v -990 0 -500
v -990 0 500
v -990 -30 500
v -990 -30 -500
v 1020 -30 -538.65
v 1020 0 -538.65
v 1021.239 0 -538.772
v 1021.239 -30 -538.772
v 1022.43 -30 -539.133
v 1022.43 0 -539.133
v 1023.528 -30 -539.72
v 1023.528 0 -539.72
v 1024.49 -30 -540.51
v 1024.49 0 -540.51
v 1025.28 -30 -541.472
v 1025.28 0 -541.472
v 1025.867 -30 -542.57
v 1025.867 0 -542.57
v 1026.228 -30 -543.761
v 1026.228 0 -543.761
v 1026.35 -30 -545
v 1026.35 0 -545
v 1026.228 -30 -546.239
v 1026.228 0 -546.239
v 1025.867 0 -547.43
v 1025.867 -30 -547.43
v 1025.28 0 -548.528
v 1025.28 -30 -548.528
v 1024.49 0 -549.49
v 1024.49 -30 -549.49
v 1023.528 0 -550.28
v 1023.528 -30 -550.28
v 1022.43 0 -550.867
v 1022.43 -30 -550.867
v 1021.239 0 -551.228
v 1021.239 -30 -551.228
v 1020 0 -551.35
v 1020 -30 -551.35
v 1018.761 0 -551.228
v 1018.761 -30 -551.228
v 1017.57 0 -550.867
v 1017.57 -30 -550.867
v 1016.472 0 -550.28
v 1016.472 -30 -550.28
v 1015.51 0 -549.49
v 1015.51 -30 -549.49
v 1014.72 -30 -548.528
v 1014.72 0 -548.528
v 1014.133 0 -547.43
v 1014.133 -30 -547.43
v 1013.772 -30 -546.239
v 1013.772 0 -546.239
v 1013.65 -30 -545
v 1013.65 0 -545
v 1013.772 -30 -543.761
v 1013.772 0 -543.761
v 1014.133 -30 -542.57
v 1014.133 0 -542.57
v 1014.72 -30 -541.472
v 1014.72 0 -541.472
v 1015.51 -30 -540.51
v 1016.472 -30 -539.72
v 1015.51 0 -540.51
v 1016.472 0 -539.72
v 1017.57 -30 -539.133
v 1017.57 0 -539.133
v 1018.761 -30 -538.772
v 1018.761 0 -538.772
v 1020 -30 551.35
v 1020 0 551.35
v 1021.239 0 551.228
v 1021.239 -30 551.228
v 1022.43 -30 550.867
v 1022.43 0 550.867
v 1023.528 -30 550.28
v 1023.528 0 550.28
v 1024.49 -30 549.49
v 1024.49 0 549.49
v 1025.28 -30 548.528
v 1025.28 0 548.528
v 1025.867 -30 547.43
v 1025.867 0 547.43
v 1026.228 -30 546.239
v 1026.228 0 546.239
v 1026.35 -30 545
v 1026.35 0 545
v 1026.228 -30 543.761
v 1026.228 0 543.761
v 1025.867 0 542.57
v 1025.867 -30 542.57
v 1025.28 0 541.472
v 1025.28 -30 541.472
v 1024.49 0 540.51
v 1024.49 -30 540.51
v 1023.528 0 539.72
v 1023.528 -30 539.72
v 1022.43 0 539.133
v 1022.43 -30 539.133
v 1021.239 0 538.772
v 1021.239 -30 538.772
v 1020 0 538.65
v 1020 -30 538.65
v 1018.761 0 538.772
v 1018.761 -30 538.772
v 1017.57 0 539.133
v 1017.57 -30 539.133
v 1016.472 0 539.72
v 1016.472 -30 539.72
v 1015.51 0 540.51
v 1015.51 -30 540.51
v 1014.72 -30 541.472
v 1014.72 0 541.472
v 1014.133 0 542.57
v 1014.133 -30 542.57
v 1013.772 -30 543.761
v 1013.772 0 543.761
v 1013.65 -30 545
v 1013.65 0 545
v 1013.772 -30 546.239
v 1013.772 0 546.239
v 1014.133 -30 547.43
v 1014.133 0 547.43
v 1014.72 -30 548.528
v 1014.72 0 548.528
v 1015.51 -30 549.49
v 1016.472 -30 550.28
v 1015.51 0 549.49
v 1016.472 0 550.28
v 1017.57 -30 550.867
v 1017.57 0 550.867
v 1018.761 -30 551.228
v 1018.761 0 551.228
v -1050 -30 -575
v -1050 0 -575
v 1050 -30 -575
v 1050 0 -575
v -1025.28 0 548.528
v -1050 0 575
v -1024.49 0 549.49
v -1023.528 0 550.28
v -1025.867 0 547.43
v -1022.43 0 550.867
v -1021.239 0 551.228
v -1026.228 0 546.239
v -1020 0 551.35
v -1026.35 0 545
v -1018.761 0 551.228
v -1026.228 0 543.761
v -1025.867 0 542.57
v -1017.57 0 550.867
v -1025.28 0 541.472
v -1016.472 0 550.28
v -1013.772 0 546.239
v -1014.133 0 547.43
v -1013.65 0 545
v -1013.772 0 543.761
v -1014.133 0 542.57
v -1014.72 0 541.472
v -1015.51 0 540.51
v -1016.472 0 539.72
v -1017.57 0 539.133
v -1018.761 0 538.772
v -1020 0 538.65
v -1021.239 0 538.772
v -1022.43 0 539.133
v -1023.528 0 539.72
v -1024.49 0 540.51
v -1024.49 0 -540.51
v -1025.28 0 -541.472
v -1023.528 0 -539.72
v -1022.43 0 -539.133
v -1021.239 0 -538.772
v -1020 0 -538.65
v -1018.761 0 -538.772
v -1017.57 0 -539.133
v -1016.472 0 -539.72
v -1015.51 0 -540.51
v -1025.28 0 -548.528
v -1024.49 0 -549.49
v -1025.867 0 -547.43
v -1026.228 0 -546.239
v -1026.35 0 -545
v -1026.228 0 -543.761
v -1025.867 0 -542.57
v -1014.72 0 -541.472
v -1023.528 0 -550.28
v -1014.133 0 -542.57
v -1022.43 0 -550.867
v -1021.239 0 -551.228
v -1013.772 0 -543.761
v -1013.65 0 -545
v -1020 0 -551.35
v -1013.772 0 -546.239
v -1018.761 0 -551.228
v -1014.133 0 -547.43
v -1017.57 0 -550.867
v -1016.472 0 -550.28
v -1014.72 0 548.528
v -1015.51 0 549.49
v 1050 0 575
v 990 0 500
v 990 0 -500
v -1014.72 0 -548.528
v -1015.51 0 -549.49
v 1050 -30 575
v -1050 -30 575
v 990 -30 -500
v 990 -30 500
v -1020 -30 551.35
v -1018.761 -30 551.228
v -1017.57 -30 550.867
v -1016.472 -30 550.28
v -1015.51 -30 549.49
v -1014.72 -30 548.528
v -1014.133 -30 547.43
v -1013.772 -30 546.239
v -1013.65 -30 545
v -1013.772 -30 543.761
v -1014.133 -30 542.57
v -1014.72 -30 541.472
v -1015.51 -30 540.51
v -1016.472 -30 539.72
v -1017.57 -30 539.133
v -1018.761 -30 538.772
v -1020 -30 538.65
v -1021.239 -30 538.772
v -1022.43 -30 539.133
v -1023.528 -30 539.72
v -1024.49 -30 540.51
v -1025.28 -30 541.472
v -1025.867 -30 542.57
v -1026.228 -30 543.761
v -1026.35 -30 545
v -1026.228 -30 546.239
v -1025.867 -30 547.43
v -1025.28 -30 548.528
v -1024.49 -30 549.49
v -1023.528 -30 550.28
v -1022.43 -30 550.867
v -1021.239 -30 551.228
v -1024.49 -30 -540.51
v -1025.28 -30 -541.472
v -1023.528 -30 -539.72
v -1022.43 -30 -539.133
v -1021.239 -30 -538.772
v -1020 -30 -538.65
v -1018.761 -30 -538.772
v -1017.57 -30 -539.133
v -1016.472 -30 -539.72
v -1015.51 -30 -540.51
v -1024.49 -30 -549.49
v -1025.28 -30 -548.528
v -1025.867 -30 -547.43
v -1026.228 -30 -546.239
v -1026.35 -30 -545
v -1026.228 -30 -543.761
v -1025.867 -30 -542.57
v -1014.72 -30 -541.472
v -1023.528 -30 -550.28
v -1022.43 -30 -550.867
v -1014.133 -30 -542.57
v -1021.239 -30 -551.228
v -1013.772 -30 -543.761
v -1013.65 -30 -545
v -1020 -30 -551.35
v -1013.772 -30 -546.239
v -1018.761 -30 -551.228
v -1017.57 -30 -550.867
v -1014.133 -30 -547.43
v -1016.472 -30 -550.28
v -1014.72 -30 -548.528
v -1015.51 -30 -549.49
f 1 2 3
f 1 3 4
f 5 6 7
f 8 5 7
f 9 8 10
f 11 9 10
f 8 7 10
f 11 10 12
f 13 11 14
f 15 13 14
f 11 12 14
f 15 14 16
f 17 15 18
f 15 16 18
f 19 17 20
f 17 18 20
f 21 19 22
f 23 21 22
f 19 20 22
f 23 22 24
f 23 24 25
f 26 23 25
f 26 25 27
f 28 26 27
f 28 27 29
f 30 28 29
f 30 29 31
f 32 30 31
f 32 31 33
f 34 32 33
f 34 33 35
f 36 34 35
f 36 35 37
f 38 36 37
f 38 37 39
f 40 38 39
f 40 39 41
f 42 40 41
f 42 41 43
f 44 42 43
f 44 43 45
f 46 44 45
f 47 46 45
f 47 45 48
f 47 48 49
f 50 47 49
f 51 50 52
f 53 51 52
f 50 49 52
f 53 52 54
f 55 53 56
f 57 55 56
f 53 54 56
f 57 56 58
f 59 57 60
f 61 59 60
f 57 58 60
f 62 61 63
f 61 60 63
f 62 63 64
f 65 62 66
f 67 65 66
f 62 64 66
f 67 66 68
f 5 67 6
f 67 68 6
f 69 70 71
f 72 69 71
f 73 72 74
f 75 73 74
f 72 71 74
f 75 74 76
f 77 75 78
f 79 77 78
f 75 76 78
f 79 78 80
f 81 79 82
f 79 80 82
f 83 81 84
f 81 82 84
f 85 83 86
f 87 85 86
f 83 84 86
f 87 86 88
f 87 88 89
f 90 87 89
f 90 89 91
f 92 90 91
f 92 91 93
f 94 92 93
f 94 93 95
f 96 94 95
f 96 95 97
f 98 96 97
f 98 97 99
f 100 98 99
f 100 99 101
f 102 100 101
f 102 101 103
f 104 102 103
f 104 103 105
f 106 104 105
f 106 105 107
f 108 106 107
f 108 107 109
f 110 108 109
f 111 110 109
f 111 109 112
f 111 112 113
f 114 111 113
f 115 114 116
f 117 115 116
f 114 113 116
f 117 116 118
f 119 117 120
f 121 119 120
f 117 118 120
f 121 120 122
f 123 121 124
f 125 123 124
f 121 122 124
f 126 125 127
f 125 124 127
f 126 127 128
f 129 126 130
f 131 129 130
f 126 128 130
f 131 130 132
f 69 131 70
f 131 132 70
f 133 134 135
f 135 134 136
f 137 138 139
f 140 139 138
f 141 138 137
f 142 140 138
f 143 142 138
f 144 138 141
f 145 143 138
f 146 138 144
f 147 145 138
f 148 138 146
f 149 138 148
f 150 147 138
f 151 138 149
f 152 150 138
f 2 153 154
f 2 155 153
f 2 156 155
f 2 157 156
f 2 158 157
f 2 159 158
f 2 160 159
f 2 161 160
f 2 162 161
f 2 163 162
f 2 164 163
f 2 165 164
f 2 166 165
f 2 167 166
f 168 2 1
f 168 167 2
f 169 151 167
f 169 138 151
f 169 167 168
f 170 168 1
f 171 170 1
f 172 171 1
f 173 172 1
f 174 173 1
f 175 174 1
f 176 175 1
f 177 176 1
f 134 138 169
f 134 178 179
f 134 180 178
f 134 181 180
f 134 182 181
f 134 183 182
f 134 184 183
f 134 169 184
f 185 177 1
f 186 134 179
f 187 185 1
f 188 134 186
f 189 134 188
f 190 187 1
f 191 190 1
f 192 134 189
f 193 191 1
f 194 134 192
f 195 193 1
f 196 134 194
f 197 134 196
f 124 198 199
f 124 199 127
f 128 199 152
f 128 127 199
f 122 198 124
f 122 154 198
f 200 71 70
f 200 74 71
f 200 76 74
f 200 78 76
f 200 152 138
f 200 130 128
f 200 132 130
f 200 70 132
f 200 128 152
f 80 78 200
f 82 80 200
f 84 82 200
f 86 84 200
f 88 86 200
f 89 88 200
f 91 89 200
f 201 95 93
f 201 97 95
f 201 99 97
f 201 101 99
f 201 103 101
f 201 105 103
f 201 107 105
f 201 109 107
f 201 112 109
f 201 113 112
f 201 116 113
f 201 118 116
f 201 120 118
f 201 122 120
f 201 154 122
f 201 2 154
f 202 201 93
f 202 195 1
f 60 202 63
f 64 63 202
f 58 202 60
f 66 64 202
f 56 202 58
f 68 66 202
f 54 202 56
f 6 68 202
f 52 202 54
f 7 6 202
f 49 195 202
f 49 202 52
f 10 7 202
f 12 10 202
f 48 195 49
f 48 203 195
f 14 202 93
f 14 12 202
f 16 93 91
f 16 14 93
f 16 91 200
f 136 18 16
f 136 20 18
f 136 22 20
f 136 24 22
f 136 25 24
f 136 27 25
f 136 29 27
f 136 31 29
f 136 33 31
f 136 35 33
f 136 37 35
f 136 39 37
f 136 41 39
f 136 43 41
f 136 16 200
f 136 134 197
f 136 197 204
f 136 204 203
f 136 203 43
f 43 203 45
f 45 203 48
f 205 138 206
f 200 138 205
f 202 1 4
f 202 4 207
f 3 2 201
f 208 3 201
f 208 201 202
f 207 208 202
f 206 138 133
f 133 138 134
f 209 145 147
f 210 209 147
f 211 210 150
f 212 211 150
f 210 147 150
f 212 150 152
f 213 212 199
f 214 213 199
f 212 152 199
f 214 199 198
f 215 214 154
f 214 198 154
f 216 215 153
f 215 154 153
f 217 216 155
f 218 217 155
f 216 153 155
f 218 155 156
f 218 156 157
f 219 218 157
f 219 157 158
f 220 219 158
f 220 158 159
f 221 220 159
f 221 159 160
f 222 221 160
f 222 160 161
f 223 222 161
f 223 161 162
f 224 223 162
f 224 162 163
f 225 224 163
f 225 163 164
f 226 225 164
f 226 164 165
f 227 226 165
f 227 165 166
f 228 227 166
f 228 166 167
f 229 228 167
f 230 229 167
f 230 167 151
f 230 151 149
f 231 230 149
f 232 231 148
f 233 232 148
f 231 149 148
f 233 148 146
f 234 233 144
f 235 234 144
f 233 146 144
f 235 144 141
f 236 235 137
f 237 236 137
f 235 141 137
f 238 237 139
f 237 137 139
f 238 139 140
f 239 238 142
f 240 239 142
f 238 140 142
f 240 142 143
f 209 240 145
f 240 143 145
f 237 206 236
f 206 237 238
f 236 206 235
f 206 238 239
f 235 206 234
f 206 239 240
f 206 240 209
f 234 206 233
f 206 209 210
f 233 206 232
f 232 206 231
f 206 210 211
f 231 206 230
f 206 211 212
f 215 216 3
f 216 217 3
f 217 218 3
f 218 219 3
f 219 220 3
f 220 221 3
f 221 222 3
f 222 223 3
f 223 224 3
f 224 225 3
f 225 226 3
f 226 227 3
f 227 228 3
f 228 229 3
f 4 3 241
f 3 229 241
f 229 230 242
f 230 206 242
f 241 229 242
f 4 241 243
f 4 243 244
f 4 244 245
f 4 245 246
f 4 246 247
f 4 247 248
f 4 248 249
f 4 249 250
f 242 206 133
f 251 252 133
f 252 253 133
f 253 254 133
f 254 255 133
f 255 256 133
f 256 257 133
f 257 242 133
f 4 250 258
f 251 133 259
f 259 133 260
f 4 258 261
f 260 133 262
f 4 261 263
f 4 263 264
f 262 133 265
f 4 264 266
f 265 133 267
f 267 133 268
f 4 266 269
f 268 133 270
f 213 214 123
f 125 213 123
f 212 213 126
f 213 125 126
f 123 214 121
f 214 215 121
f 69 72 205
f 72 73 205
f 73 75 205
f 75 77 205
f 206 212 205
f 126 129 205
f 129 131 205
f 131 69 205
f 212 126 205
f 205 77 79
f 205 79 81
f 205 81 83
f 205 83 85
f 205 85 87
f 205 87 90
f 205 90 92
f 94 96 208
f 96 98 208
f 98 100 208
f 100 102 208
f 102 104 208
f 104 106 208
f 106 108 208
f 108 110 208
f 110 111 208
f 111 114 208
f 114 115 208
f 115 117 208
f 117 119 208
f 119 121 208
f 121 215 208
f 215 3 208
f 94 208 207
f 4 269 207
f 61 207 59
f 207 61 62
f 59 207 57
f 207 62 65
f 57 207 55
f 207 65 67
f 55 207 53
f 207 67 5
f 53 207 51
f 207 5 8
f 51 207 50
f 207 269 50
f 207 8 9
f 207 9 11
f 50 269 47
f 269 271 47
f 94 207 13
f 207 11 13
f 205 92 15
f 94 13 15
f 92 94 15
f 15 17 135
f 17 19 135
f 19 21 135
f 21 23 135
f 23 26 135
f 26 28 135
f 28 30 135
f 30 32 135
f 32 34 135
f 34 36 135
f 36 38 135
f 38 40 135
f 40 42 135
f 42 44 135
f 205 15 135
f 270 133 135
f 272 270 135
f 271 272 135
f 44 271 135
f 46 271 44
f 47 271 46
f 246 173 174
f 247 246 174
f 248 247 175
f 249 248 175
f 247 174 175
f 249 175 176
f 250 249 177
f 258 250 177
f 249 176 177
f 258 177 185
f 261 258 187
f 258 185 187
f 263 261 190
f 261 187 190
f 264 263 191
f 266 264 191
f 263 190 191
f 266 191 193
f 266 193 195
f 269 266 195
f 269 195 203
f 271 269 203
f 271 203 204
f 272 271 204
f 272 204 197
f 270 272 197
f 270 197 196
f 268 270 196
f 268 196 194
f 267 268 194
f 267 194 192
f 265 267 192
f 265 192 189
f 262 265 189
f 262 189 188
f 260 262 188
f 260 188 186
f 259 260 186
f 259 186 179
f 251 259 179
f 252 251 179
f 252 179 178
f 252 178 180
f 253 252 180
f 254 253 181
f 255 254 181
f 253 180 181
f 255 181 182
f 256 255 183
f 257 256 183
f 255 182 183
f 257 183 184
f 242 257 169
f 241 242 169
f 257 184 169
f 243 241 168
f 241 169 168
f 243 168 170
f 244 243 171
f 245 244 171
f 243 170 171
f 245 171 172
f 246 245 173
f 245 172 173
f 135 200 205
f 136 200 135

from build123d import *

# Parameters (mm, degrees)
SKETCH1_W           = 2100
SKETCH1_H           = 1150
SKETCH1_W_2         = 1980
SKETCH1_H_2         = 1000
BOSS_EXTRUDE1_DEPTH = 30
SKETCH2_R           = 6.35
CUT_EXTRUDE1_DEPTH  = 1198.507828784


with BuildPart() as part:
    # Sketch1 → Boss-Extrude1 (new body)
    with BuildSketch(Plane(origin=(0, 0, 0), x_dir=(1, 0, 0), z_dir=(0, 1, 0))):
        Rectangle(SKETCH1_W, SKETCH1_H)
        Rectangle(SKETCH1_W_2, SKETCH1_H_2, mode=Mode.SUBTRACT)
    extrude(amount=-BOSS_EXTRUDE1_DEPTH)

    # Sketch2 → Cut-Extrude1 (cut, through all)
    with BuildSketch(Plane(origin=(0, 0, 0), x_dir=(1, 0, 0), z_dir=(0, 1, 0))):
        with Locations(Location((-1020, 545, 0), (0, 0, 270))):
            Circle(SKETCH2_R)
        with Locations(Location((-1020, -545, 0), (0, 0, 270))):
            Circle(SKETCH2_R)
        with Locations(Location((1020, 545, 0), (0, 0, 270))):
            Circle(SKETCH2_R)
        with Locations(Location((1020, -545, 0), (0, 0, 270))):
            Circle(SKETCH2_R)
    extrude(amount=-CUT_EXTRUDE1_DEPTH, mode=Mode.SUBTRACT)


solid = part.part
